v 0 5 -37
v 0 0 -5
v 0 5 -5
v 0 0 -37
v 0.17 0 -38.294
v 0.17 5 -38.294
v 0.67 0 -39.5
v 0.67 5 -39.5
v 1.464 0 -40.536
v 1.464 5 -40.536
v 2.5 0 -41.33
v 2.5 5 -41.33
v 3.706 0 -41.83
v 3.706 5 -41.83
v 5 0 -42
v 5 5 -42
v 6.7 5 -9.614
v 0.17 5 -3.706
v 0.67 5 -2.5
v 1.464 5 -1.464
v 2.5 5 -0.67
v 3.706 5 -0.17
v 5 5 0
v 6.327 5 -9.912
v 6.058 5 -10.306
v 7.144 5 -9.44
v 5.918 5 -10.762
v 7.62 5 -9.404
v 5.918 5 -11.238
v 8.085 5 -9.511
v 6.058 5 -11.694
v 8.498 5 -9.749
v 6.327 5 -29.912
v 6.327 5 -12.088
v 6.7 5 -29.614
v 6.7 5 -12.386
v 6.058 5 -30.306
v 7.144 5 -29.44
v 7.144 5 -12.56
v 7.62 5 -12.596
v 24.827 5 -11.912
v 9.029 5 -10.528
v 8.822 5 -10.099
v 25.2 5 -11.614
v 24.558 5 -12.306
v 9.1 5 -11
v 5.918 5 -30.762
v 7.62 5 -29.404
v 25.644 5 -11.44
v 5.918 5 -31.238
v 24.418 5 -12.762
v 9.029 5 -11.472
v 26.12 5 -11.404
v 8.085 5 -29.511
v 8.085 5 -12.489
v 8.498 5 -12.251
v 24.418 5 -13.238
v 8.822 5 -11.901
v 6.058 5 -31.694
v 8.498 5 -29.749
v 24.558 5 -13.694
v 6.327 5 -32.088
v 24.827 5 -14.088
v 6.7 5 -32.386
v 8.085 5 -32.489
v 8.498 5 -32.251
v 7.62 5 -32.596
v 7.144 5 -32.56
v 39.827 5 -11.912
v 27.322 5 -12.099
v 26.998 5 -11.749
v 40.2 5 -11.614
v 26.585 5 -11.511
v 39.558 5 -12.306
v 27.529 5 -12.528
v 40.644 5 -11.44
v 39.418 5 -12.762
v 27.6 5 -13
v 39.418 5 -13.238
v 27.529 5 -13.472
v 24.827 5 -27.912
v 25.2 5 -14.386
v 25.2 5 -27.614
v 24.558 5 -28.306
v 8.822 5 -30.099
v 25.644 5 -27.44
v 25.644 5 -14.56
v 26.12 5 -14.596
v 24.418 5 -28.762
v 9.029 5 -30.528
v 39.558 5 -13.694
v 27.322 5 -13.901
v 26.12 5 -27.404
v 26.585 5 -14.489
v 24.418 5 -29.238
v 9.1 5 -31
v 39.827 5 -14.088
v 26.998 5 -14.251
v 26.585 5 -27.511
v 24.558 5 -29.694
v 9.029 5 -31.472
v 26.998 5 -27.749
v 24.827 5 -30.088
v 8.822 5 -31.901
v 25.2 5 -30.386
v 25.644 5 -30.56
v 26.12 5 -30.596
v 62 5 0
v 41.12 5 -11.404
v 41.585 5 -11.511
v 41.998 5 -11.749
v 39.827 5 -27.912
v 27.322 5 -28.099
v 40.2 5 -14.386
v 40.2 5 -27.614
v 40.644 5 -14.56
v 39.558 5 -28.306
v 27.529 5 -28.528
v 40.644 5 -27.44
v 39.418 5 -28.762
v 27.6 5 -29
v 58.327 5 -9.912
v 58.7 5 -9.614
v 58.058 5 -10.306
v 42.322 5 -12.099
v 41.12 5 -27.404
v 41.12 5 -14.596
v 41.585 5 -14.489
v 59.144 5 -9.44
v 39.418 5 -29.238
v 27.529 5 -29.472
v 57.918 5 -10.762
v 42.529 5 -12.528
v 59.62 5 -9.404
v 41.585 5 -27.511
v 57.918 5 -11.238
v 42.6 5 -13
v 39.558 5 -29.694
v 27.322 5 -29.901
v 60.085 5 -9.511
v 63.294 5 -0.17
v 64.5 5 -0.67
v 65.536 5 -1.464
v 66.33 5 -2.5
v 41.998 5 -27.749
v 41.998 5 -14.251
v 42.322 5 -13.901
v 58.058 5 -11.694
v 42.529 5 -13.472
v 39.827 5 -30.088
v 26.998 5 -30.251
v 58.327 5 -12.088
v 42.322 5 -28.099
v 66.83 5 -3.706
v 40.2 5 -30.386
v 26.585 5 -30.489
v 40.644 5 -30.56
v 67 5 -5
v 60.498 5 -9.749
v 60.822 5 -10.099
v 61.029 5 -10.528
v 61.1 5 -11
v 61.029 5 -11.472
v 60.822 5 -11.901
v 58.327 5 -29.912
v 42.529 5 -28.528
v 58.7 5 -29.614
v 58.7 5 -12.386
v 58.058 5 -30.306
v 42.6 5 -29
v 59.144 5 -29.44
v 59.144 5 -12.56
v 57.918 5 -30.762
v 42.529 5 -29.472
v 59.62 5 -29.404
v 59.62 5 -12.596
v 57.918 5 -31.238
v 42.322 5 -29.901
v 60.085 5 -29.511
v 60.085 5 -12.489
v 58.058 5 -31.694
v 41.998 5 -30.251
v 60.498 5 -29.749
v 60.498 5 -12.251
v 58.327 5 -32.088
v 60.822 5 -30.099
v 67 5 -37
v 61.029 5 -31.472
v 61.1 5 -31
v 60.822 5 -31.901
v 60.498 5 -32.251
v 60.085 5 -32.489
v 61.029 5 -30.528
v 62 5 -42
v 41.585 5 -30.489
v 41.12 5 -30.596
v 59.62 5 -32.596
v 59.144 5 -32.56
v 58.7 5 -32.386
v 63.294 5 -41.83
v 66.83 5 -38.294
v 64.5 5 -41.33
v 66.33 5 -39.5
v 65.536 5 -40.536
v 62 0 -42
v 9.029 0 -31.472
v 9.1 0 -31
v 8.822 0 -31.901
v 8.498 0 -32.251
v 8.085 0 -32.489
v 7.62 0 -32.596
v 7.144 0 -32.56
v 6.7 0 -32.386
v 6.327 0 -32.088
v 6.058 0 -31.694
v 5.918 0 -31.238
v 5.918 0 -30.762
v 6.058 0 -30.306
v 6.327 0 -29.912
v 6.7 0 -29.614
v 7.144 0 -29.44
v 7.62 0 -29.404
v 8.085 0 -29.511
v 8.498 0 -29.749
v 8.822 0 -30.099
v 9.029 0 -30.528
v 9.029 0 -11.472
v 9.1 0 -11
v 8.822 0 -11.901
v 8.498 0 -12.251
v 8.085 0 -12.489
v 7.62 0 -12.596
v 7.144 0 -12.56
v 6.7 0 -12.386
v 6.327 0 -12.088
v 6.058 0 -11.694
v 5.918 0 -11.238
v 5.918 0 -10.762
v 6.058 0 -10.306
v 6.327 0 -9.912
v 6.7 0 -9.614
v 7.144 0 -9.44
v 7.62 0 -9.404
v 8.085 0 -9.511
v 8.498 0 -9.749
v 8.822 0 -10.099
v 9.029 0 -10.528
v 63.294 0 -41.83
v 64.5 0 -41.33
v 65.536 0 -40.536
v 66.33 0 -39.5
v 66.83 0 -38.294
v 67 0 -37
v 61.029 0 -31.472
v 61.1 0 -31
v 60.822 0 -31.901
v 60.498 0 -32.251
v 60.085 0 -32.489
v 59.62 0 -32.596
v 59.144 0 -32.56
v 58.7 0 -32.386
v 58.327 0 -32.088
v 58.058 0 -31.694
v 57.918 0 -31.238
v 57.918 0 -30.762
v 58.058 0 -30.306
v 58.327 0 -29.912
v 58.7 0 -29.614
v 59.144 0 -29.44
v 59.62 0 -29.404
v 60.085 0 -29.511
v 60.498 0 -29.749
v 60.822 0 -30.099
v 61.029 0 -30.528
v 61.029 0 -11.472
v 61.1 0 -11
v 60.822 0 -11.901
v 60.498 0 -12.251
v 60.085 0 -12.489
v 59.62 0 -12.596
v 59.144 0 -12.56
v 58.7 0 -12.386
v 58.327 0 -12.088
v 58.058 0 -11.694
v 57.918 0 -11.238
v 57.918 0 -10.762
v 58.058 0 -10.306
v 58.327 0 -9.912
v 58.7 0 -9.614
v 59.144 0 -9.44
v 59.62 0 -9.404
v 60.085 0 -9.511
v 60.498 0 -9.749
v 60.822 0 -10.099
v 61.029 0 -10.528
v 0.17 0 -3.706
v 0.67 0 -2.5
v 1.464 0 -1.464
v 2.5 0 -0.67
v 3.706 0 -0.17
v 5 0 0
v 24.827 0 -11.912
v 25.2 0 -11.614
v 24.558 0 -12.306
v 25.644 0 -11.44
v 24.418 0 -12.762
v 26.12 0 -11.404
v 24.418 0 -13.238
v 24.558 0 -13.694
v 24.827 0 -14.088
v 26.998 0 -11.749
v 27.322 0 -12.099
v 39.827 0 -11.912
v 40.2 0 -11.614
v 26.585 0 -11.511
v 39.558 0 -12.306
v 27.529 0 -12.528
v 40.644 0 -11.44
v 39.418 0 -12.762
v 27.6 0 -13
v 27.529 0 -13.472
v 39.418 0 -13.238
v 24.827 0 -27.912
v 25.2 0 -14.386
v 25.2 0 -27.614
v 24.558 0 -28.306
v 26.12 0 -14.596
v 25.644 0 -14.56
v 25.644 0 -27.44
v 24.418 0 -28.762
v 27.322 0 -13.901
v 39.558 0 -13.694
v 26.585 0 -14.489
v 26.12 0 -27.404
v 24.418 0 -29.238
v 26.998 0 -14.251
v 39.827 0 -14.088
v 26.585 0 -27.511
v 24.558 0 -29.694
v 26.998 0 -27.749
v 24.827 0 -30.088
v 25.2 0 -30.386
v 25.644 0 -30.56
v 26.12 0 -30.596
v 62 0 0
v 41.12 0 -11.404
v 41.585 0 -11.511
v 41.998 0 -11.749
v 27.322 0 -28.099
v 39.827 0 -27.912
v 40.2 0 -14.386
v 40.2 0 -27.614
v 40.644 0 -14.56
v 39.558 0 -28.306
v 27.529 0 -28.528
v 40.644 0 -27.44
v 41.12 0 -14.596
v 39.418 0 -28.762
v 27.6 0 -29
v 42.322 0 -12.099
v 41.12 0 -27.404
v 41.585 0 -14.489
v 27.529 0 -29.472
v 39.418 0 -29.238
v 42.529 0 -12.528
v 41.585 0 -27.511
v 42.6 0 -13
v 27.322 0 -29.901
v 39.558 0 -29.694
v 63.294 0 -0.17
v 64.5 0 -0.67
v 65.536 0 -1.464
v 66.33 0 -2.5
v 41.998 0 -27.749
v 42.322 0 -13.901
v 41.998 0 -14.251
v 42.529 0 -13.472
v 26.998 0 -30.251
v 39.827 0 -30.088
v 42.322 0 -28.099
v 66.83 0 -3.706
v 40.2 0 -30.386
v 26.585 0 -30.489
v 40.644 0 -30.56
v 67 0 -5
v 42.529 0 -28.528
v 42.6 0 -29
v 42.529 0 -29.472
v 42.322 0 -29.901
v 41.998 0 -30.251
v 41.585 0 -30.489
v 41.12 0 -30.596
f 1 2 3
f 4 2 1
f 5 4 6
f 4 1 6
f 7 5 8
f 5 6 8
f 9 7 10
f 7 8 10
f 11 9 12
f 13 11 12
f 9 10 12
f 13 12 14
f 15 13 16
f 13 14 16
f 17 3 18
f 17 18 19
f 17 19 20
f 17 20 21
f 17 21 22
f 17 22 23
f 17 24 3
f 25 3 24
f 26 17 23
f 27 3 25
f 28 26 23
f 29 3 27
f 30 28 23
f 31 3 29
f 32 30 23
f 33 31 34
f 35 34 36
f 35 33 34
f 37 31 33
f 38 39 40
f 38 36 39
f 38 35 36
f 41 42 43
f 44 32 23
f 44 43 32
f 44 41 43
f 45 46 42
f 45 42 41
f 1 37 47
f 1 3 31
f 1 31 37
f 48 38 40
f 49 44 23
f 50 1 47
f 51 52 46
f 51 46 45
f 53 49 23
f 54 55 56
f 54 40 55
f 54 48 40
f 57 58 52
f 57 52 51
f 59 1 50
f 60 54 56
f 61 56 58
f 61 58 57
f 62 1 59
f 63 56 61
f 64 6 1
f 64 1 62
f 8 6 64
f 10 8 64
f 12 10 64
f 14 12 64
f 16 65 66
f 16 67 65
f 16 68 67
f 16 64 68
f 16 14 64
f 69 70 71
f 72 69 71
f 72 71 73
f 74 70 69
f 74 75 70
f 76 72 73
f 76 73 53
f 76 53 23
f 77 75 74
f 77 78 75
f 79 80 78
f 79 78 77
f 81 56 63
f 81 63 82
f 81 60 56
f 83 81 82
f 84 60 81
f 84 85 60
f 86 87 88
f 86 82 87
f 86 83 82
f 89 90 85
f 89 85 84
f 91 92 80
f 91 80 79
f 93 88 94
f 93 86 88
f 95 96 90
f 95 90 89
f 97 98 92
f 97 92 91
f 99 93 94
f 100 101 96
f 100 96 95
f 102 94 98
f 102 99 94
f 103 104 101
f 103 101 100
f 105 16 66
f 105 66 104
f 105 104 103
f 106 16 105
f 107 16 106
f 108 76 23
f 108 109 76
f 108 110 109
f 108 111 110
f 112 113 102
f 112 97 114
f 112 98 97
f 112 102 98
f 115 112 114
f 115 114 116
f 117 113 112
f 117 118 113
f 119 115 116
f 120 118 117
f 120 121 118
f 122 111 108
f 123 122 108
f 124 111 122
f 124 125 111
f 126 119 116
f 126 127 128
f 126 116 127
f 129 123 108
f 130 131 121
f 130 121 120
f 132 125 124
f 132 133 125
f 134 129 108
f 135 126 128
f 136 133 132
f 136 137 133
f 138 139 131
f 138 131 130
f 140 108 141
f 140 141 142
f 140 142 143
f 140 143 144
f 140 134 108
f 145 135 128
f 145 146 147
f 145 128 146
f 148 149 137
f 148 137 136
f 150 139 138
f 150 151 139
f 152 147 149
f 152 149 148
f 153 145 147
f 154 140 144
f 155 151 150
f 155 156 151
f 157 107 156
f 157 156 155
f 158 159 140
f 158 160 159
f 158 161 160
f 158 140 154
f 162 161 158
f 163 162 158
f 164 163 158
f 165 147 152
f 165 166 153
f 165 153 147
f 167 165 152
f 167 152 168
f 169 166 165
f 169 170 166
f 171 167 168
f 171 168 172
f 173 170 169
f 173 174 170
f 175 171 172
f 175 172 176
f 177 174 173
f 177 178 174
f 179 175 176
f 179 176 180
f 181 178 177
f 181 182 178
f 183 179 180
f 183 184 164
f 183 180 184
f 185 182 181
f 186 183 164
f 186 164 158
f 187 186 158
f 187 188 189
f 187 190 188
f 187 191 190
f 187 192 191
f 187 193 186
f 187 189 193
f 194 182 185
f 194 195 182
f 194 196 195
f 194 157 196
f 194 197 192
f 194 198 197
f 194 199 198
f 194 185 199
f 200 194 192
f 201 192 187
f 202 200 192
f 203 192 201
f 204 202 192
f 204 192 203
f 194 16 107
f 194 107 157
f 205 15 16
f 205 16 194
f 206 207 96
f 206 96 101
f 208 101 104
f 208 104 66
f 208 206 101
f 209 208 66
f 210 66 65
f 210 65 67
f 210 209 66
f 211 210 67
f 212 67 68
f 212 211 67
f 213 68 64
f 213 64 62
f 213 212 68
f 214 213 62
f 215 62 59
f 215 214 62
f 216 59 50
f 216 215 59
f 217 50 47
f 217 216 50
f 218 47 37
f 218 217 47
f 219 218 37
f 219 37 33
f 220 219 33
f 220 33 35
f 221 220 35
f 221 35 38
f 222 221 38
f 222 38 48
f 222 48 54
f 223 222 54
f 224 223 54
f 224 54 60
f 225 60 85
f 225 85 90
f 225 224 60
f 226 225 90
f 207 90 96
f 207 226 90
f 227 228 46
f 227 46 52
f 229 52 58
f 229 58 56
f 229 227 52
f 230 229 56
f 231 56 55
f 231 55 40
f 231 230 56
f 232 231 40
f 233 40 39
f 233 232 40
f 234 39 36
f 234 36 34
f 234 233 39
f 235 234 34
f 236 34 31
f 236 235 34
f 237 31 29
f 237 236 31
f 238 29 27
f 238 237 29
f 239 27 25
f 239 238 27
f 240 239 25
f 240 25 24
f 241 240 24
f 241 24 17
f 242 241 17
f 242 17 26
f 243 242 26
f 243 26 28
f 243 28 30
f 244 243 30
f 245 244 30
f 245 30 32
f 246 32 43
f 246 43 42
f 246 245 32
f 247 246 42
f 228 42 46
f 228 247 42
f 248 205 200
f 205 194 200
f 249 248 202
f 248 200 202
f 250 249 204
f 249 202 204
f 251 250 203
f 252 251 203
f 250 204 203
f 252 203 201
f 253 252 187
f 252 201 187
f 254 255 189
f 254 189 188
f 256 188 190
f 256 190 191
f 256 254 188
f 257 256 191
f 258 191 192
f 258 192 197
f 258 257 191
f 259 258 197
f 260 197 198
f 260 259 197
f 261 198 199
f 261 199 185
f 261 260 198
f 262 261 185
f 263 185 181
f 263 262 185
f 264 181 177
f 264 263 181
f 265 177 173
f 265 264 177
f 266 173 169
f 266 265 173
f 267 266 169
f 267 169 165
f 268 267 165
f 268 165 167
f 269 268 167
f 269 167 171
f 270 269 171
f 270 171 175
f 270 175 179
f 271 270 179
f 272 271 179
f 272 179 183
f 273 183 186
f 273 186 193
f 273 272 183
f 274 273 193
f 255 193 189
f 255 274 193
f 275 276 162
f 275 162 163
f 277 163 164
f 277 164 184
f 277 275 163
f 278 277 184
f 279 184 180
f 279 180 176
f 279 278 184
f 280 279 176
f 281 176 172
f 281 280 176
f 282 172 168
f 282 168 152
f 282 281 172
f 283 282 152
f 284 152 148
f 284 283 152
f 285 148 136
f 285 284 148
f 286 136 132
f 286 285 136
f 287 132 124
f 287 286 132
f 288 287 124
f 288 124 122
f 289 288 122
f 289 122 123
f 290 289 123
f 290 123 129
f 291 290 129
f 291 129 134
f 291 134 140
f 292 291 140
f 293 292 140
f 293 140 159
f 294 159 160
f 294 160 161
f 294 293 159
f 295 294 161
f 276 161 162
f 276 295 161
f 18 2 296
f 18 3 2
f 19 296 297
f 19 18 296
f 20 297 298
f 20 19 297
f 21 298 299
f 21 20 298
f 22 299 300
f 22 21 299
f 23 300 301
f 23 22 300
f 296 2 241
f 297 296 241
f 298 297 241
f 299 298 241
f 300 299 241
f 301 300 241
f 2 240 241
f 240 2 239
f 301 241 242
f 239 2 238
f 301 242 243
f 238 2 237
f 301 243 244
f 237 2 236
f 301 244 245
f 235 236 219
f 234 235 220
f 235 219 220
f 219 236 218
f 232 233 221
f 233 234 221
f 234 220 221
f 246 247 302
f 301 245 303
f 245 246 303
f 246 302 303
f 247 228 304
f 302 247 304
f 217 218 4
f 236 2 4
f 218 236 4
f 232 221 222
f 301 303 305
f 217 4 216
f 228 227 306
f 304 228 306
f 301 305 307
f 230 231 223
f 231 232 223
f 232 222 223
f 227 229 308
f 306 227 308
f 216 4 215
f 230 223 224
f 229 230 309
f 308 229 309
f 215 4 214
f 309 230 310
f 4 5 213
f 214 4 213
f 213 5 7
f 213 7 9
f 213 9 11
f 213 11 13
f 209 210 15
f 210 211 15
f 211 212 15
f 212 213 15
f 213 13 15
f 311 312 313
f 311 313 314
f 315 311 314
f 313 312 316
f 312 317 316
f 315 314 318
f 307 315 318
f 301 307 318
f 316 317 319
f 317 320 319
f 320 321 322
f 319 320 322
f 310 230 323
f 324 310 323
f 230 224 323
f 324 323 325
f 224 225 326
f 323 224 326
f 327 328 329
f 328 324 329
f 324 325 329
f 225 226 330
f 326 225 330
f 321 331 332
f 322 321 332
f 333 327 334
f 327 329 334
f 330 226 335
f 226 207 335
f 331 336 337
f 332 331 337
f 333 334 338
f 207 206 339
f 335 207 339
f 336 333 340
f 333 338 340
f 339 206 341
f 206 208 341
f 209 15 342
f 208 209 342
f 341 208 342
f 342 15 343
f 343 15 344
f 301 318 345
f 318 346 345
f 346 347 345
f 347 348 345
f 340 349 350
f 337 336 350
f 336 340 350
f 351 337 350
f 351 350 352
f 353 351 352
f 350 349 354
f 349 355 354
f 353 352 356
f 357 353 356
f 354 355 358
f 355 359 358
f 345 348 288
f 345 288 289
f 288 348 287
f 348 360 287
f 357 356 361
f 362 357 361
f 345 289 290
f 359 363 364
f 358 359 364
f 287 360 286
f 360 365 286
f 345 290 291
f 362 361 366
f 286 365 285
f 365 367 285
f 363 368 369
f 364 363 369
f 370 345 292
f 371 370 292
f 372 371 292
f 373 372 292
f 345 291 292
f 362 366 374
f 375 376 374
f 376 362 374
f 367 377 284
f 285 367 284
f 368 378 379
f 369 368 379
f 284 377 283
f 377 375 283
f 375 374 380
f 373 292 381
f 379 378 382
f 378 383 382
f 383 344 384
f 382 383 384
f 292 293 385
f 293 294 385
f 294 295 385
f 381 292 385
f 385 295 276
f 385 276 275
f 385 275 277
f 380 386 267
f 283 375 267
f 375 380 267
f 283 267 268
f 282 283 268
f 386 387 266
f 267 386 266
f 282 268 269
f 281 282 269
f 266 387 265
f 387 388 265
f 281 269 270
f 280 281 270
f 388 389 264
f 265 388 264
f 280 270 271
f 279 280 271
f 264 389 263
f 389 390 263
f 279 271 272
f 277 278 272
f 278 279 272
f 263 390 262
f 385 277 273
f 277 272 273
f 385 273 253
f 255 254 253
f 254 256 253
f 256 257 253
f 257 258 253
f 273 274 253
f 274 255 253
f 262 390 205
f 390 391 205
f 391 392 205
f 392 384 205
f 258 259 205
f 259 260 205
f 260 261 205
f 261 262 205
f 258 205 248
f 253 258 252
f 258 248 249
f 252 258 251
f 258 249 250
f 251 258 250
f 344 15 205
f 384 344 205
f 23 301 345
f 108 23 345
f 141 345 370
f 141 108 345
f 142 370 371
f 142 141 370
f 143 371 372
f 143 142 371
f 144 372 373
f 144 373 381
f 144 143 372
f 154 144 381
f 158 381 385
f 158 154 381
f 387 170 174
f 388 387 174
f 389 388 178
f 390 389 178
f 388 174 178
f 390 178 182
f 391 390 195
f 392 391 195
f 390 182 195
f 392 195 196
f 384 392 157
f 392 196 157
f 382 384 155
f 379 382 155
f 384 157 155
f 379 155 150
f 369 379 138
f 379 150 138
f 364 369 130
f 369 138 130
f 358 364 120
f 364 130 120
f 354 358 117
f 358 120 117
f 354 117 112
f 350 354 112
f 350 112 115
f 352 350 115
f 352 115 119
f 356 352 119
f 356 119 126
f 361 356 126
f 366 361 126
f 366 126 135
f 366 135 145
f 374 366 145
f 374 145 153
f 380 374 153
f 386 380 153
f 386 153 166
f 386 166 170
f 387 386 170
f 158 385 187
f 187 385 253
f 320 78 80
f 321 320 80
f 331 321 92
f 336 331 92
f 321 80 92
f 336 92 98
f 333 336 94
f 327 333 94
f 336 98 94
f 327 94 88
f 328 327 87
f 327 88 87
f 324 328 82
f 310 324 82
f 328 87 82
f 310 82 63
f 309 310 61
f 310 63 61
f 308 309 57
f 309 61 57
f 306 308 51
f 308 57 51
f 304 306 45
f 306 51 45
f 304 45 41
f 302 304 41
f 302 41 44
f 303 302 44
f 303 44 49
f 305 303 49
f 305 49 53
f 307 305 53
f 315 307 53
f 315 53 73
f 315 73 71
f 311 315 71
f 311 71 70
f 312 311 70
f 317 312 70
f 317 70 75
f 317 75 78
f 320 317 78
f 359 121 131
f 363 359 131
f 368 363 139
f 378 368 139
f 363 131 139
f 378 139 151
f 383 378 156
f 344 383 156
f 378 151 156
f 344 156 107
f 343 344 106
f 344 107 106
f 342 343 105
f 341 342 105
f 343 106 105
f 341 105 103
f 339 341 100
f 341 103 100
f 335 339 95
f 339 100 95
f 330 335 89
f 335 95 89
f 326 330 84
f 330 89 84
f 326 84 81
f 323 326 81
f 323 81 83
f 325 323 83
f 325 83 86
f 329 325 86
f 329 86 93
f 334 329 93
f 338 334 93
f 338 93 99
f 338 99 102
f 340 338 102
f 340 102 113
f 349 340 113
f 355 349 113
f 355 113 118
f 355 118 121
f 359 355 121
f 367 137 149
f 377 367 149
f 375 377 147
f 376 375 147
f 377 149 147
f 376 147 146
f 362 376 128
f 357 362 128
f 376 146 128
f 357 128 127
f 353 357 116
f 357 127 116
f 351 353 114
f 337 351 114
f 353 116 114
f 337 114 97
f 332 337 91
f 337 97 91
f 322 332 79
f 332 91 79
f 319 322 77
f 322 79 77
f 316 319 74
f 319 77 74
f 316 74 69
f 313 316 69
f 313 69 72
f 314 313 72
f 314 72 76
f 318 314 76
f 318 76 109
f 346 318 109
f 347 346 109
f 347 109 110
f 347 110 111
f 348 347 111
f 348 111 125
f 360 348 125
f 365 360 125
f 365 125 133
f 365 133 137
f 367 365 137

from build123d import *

# Parameters (mm, degrees)
SKETCH1_W           = 67
SKETCH1_H           = 42
SKETCH1_R           = 1.6
BOSS_EXTRUDE1_DEPTH = 5
SKETCH2_R           = 1.6
CUT_EXTRUDE1_DEPTH  = 6
FILLET1_R           = 5


with BuildPart() as part:
    # Sketch1 → Boss-Extrude1 (new body)
    with BuildSketch(Plane(origin=(0, 0, 0), x_dir=(1, 0, 0), z_dir=(0, 1, 0))):
        with Locations((33.5, 21)):
            Rectangle(SKETCH1_W, SKETCH1_H)
        with Locations((7.5, 31)):
            Circle(SKETCH1_R, mode=Mode.SUBTRACT)
        with Locations((7.5, 11)):
            Circle(SKETCH1_R, mode=Mode.SUBTRACT)
        with Locations((59.5, 11)):
            Circle(SKETCH1_R, mode=Mode.SUBTRACT)
        with Locations((59.5, 31)):
            Circle(SKETCH1_R, mode=Mode.SUBTRACT)
    extrude(amount=BOSS_EXTRUDE1_DEPTH)

    # Sketch2 → Cut-Extrude1 (cut, through all)
    with BuildSketch(Plane(origin=(0, 5, 0), x_dir=(1, 0, 0), z_dir=(0, 1, 0))):
        with Locations((41, 29)):
            Circle(SKETCH2_R)
        with Locations((41, 13)):
            Circle(SKETCH2_R)
        with Locations((26, 13)):
            Circle(SKETCH2_R)
        with Locations((26, 29)):
            Circle(SKETCH2_R)
    extrude(amount=-CUT_EXTRUDE1_DEPTH, mode=Mode.SUBTRACT)

    # Fillet1
    fillet1_edges = [part.edges().sort_by_distance(p)[0] for p in [
        (0, 2.5, -42),
        (67, 2.5, -42),
        (67, 2.5, 0),
        (0, 2.5, 0),
    ]]
    fillet(fillet1_edges, radius=FILLET1_R)


solid = part.part
